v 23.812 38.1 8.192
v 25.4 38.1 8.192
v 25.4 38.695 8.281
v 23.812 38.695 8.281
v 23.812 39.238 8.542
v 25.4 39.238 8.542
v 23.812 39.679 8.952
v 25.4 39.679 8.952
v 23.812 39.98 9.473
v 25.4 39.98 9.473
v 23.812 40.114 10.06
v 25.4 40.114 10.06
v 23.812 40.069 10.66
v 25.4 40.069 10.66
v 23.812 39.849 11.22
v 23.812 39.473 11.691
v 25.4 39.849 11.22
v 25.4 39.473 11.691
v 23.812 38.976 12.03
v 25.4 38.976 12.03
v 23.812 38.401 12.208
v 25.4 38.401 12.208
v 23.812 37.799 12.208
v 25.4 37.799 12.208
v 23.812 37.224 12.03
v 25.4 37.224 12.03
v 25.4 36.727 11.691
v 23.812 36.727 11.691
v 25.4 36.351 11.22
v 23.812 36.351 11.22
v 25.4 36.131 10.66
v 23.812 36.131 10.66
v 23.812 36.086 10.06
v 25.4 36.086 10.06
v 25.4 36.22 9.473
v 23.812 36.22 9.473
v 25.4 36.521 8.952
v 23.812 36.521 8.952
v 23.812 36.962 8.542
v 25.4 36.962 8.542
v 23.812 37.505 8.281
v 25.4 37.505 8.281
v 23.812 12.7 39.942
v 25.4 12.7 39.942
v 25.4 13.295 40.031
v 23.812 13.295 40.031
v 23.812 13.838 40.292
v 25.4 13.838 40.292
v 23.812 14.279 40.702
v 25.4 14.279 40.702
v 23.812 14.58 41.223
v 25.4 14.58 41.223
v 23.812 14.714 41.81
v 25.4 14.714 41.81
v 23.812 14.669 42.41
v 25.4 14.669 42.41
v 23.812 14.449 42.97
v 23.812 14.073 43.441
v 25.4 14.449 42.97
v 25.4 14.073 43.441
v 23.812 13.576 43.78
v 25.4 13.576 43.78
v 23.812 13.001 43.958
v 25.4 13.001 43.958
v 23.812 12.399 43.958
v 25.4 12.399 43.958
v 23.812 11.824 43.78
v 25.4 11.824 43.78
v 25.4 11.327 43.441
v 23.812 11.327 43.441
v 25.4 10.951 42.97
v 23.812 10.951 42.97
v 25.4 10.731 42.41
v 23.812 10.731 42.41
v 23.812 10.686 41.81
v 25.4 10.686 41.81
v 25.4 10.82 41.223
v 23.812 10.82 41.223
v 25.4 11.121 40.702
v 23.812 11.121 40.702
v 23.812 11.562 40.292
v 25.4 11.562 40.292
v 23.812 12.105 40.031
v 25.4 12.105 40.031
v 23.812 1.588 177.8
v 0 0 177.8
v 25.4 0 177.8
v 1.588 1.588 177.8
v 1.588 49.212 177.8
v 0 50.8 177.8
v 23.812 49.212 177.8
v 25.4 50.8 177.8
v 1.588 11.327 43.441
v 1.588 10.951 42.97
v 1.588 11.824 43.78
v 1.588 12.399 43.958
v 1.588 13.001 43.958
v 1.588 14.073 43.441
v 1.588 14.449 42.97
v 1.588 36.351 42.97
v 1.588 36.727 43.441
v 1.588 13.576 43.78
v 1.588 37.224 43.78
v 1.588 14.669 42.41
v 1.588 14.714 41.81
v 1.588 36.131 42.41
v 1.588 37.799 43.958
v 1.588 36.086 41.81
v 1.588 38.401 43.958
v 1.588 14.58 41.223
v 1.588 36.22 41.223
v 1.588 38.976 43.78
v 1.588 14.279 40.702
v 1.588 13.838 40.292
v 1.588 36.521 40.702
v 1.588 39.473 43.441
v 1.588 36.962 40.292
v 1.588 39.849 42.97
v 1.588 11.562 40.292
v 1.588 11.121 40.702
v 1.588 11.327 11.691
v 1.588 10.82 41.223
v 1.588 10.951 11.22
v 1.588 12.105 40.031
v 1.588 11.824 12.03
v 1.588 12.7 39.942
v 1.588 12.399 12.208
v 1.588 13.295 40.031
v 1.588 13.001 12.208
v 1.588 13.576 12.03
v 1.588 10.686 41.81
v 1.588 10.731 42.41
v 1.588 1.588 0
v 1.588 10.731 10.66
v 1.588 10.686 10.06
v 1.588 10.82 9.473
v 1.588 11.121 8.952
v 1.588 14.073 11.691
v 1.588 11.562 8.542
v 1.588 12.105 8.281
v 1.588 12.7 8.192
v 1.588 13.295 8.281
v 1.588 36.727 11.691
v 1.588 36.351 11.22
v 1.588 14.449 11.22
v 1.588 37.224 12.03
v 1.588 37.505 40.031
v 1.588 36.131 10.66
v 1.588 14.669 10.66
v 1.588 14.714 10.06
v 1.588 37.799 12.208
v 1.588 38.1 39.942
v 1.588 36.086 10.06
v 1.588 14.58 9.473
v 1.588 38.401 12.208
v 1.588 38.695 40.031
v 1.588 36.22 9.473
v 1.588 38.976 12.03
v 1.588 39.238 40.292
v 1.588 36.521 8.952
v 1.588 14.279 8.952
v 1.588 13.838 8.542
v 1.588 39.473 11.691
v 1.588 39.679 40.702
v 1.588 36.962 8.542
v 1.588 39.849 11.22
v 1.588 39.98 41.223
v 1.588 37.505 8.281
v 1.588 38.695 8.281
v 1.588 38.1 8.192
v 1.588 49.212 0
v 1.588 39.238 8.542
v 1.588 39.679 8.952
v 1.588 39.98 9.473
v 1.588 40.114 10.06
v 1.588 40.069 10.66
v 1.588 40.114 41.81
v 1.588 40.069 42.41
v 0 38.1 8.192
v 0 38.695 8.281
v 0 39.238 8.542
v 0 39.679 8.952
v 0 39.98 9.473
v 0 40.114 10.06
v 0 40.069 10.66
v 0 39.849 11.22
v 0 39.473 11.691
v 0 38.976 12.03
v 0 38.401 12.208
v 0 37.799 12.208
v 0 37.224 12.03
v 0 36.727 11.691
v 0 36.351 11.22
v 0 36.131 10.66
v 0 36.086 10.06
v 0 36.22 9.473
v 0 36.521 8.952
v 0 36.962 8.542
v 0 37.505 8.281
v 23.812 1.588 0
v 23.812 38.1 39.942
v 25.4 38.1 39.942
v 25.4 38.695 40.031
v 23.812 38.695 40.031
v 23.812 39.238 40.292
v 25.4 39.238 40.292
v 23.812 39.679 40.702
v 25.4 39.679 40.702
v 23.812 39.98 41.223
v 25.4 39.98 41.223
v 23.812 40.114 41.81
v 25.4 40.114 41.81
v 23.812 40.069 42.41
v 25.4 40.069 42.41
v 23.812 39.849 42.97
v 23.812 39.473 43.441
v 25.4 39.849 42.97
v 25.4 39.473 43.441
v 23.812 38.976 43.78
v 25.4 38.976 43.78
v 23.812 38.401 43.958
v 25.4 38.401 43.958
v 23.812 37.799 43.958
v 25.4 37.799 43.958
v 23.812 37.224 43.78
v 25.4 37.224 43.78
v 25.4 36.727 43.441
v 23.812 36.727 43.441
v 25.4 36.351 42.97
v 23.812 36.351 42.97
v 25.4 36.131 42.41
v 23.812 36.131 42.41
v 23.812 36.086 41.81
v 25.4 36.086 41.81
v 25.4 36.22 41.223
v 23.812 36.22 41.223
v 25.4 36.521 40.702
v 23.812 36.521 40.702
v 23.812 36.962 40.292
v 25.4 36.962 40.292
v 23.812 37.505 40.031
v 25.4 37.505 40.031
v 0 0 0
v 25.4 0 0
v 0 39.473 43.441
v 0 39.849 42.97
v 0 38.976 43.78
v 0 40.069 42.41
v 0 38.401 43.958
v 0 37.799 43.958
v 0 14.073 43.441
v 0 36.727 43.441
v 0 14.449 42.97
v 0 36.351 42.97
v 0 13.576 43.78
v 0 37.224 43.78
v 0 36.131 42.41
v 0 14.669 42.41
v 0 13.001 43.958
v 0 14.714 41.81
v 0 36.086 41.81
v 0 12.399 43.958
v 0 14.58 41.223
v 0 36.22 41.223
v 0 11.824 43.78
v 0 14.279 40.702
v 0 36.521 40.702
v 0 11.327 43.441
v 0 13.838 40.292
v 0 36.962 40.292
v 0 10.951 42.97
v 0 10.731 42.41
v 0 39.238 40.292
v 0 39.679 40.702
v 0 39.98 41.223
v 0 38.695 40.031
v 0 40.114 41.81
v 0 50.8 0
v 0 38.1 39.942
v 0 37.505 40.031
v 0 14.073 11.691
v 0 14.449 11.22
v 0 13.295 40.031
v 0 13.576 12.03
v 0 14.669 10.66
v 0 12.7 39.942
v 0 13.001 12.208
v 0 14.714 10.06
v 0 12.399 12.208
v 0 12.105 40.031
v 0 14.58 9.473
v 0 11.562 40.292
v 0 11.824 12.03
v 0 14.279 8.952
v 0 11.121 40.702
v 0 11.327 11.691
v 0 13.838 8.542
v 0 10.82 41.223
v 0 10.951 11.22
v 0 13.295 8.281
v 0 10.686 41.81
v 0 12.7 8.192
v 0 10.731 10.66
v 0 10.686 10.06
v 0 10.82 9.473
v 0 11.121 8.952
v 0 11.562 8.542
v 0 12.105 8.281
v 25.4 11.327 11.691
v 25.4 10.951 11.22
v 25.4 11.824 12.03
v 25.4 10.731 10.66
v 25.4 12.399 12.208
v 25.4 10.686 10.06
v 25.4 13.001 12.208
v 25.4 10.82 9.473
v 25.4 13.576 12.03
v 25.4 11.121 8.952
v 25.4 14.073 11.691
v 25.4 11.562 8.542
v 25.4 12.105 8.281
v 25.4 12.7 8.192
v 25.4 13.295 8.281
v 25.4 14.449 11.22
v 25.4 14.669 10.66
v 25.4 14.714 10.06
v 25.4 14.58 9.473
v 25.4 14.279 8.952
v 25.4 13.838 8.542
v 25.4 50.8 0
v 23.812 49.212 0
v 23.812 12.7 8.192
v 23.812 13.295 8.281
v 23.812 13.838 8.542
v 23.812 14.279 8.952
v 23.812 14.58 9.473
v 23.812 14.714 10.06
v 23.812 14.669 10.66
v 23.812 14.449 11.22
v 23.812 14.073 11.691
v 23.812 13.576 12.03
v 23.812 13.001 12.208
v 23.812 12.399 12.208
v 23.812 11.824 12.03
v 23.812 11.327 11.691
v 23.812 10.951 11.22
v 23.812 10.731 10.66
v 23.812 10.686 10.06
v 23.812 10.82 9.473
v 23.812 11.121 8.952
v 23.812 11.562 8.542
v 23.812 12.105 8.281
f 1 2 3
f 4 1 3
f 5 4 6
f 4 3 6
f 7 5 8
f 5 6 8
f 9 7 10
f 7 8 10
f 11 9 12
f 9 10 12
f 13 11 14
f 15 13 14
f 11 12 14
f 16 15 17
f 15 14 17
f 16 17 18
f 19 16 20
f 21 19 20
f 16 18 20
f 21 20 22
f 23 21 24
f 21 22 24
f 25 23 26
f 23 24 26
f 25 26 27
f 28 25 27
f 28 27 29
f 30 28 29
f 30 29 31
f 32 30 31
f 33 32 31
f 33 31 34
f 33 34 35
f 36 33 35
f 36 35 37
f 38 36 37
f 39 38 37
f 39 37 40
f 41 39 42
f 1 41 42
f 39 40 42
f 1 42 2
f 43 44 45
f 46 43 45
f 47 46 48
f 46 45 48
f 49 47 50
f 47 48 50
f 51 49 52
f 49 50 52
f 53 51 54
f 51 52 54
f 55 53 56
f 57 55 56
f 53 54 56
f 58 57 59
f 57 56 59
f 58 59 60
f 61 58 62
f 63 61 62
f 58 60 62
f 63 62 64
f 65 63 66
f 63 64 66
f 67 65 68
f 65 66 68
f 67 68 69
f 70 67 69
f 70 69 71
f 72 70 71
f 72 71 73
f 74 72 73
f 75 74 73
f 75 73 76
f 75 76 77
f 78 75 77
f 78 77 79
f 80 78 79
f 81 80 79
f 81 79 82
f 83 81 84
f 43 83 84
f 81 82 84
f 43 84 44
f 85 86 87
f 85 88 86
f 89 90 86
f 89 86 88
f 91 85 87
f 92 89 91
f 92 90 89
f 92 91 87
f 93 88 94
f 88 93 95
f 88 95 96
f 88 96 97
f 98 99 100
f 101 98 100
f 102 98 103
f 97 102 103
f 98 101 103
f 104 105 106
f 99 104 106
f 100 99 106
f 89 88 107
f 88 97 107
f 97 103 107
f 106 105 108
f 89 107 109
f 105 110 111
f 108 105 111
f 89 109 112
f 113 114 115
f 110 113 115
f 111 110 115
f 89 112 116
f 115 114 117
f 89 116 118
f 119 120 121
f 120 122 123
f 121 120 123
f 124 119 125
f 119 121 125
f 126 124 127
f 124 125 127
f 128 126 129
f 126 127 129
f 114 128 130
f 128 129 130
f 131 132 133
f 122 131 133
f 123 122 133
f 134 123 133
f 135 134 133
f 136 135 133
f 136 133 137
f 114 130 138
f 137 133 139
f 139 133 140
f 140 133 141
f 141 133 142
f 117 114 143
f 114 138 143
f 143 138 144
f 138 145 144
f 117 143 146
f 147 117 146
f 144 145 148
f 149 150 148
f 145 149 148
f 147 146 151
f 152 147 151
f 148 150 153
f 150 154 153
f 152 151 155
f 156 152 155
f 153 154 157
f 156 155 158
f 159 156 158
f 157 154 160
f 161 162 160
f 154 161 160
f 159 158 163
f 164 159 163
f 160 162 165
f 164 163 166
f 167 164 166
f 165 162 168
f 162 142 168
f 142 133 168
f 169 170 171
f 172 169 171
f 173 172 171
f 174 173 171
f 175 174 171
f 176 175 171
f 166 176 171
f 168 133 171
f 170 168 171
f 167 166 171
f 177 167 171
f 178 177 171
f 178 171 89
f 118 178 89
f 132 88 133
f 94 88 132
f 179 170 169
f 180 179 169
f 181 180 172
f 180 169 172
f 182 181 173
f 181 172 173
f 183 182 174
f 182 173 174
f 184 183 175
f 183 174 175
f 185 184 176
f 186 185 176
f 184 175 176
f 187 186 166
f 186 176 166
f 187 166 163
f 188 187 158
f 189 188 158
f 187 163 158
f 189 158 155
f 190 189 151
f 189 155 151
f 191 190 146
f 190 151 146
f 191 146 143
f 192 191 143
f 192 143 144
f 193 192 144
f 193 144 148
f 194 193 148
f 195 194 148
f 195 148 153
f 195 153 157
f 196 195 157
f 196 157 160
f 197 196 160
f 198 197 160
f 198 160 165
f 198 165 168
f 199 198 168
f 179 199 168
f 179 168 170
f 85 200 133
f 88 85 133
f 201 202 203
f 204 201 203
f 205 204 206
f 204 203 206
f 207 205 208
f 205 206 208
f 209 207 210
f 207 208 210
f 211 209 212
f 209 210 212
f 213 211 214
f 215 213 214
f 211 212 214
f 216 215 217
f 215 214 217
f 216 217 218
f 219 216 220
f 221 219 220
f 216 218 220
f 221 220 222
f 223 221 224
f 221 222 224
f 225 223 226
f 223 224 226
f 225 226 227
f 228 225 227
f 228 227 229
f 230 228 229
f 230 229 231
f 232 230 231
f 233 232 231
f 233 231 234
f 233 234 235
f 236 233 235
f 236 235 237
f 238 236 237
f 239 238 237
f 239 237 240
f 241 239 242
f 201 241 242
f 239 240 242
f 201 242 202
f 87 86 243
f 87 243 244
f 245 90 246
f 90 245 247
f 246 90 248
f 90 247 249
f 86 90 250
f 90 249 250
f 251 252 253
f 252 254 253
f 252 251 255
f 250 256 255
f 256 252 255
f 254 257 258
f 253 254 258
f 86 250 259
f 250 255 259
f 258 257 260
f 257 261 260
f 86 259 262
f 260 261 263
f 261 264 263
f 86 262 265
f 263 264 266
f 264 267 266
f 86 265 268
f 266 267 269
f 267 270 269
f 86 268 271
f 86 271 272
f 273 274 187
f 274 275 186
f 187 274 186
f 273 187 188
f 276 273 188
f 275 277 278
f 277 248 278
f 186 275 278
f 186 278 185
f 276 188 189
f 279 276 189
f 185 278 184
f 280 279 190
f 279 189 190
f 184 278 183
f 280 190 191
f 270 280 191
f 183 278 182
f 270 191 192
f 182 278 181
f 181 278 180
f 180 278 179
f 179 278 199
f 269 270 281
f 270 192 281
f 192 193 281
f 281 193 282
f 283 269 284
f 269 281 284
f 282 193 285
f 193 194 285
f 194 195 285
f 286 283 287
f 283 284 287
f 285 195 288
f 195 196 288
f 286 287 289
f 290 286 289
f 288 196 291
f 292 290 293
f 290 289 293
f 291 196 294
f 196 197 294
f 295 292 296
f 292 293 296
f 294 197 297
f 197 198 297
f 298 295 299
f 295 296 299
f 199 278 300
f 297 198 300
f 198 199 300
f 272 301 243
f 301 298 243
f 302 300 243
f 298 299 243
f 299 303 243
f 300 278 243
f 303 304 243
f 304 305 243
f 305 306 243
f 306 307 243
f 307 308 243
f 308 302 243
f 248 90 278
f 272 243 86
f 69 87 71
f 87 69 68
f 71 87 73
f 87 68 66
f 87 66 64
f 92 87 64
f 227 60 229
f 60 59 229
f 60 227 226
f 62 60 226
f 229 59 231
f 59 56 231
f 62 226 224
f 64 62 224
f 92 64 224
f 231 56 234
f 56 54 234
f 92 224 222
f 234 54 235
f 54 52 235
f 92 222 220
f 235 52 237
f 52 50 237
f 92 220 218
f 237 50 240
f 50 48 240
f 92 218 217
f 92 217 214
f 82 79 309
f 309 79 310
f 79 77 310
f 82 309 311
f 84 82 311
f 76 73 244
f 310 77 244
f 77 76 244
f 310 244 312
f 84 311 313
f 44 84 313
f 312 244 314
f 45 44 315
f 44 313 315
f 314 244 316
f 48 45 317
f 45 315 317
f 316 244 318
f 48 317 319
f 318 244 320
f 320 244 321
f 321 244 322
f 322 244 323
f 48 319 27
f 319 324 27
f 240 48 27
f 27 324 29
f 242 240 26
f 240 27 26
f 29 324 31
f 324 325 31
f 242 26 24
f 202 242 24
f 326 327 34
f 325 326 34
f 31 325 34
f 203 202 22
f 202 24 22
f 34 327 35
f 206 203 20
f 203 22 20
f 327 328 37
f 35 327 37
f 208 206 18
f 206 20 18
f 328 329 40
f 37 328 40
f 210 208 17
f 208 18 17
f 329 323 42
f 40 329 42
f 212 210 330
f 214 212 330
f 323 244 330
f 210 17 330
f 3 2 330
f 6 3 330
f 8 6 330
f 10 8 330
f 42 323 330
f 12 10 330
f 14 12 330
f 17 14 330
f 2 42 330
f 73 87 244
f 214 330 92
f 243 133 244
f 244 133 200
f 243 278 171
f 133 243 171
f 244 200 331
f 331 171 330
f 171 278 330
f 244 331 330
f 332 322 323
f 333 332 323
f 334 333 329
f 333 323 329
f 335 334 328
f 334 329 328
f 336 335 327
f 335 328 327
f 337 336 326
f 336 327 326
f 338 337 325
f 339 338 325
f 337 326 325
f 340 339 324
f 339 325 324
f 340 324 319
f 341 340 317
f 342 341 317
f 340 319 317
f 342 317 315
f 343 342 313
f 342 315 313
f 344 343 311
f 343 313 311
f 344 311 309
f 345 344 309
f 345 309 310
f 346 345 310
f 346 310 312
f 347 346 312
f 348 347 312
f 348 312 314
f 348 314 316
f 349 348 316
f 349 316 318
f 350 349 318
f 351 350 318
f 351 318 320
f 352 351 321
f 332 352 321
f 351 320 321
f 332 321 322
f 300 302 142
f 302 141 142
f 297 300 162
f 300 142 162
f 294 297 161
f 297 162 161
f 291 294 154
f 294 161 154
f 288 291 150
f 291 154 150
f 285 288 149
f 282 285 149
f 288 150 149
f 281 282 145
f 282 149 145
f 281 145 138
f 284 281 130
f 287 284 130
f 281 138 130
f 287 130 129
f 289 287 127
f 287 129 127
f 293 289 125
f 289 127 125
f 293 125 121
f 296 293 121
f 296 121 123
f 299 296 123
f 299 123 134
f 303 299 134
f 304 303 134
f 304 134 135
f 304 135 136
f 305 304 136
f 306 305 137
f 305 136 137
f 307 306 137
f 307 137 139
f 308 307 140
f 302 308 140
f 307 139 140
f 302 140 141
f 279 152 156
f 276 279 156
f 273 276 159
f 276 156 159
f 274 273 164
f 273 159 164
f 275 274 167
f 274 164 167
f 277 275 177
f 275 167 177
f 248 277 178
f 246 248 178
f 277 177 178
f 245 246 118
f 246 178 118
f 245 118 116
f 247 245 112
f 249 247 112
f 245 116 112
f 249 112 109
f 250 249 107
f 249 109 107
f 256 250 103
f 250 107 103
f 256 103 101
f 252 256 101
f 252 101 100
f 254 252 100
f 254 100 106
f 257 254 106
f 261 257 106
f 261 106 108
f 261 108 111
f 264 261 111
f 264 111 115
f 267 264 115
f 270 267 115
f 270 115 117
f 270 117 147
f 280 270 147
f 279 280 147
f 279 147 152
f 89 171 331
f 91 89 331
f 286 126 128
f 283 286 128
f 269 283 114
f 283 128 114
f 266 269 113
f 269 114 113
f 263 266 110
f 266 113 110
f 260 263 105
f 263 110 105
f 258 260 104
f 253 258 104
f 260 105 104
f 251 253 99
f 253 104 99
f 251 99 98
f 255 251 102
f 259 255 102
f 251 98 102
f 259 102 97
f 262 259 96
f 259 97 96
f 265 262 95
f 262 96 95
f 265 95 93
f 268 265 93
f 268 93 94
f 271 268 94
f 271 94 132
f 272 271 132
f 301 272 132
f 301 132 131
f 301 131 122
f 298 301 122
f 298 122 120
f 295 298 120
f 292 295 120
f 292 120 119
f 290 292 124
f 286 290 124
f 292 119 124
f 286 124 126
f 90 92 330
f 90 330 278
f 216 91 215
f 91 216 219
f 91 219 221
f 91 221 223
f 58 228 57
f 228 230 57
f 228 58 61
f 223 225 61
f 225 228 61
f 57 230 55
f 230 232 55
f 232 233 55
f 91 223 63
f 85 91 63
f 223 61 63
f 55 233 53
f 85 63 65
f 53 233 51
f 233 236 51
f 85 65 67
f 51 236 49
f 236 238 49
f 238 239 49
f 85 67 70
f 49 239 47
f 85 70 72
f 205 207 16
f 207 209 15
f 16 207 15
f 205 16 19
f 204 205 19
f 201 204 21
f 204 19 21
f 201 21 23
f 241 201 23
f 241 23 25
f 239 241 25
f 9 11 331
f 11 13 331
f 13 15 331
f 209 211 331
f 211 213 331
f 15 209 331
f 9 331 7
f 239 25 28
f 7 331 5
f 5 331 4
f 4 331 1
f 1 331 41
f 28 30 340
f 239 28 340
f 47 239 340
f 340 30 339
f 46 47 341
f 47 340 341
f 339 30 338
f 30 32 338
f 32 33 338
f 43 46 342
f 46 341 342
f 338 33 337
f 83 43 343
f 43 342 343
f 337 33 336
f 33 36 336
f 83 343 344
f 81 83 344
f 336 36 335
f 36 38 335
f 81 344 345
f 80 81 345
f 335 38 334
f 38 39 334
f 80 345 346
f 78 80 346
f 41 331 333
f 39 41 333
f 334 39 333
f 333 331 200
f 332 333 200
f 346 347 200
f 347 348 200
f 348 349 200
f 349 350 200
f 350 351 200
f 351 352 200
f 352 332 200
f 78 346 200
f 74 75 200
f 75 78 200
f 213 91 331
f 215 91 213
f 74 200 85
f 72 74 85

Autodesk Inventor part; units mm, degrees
ref_plane "YZ Plane" through (0, 0, 0) normal (1, 0, 0) x (0, 1, 0)
ref_plane "XZ Plane" through (0, 0, 0) normal (0, 1, 0) x (-1, 0, 0)
ref_plane "XY Plane" through (0, 0, 0) normal (0, 0, 1) x (1, 0, 0)
sketch "Sketch1" plane through (0, 0, 0) normal (0, 0, 1) x (1, 0, 0)
  line L0 (0, 0) -> (25.4, 0)
  line L1 (25.4, 0) -> (25.4, 50.8)
  line L2 (25.4, 50.8) -> (0, 50.8)
  line L3 (0, 50.8) -> (0, 0)
  line L4 (23.8125, 49.2125) -> (23.8125, 1.5875)
  line L5 (23.8125, 1.5875) -> (1.5875, 1.5875)
  line L6 (1.5875, 1.5875) -> (1.5875, 49.2125)
  line L7 (1.5875, 49.2125) -> (23.8125, 49.2125)
  dimension "d0" = 25.4
  dimension "d1" = 50.8
  dimension "d2" = 1.5875
extrude "Extrusion1" add sketch "Sketch1" along normal blind 177.8
sketch "Sketch2" plane through (25.4, 0, 0) normal (1, 0, 0) x (0, 0, -1)
  line L0 (0, 1.5875) -> (0, 49.2125) construction
  line L1 (0, 25.4) -> (0, 38.1) construction
  line L2 (0, 38.1) -> (-10.2108, 38.1) construction
  line L3 (-10.2108, 38.1) -> (-10.2108, 12.7) construction
  line L4 (-10.2108, 12.7) -> (-41.9608, 12.7) construction
  line L5 (-41.9608, 12.7) -> (-41.9608, 38.1) construction
  circle A0 centre (-10.2108, 38.1) radius 2.0193
  circle A1 centre (-10.2108, 12.7) radius 2.0193
  circle A2 centre (-41.9608, 12.7) radius 2.0193
  circle A3 centre (-41.9608, 38.1) radius 2.0193
  point P0 (0, 0)
  dimension "d5" = 12.7
  dimension "d6" = 10.2108
  dimension "d7" = 25.4
  dimension "d9" = 31.75
  dimension "d10" = 4.0386
extrude "Extrusion2" cut sketch "Sketch2" against normal blind 177.8
properties part number "1x2 Placeholder"
